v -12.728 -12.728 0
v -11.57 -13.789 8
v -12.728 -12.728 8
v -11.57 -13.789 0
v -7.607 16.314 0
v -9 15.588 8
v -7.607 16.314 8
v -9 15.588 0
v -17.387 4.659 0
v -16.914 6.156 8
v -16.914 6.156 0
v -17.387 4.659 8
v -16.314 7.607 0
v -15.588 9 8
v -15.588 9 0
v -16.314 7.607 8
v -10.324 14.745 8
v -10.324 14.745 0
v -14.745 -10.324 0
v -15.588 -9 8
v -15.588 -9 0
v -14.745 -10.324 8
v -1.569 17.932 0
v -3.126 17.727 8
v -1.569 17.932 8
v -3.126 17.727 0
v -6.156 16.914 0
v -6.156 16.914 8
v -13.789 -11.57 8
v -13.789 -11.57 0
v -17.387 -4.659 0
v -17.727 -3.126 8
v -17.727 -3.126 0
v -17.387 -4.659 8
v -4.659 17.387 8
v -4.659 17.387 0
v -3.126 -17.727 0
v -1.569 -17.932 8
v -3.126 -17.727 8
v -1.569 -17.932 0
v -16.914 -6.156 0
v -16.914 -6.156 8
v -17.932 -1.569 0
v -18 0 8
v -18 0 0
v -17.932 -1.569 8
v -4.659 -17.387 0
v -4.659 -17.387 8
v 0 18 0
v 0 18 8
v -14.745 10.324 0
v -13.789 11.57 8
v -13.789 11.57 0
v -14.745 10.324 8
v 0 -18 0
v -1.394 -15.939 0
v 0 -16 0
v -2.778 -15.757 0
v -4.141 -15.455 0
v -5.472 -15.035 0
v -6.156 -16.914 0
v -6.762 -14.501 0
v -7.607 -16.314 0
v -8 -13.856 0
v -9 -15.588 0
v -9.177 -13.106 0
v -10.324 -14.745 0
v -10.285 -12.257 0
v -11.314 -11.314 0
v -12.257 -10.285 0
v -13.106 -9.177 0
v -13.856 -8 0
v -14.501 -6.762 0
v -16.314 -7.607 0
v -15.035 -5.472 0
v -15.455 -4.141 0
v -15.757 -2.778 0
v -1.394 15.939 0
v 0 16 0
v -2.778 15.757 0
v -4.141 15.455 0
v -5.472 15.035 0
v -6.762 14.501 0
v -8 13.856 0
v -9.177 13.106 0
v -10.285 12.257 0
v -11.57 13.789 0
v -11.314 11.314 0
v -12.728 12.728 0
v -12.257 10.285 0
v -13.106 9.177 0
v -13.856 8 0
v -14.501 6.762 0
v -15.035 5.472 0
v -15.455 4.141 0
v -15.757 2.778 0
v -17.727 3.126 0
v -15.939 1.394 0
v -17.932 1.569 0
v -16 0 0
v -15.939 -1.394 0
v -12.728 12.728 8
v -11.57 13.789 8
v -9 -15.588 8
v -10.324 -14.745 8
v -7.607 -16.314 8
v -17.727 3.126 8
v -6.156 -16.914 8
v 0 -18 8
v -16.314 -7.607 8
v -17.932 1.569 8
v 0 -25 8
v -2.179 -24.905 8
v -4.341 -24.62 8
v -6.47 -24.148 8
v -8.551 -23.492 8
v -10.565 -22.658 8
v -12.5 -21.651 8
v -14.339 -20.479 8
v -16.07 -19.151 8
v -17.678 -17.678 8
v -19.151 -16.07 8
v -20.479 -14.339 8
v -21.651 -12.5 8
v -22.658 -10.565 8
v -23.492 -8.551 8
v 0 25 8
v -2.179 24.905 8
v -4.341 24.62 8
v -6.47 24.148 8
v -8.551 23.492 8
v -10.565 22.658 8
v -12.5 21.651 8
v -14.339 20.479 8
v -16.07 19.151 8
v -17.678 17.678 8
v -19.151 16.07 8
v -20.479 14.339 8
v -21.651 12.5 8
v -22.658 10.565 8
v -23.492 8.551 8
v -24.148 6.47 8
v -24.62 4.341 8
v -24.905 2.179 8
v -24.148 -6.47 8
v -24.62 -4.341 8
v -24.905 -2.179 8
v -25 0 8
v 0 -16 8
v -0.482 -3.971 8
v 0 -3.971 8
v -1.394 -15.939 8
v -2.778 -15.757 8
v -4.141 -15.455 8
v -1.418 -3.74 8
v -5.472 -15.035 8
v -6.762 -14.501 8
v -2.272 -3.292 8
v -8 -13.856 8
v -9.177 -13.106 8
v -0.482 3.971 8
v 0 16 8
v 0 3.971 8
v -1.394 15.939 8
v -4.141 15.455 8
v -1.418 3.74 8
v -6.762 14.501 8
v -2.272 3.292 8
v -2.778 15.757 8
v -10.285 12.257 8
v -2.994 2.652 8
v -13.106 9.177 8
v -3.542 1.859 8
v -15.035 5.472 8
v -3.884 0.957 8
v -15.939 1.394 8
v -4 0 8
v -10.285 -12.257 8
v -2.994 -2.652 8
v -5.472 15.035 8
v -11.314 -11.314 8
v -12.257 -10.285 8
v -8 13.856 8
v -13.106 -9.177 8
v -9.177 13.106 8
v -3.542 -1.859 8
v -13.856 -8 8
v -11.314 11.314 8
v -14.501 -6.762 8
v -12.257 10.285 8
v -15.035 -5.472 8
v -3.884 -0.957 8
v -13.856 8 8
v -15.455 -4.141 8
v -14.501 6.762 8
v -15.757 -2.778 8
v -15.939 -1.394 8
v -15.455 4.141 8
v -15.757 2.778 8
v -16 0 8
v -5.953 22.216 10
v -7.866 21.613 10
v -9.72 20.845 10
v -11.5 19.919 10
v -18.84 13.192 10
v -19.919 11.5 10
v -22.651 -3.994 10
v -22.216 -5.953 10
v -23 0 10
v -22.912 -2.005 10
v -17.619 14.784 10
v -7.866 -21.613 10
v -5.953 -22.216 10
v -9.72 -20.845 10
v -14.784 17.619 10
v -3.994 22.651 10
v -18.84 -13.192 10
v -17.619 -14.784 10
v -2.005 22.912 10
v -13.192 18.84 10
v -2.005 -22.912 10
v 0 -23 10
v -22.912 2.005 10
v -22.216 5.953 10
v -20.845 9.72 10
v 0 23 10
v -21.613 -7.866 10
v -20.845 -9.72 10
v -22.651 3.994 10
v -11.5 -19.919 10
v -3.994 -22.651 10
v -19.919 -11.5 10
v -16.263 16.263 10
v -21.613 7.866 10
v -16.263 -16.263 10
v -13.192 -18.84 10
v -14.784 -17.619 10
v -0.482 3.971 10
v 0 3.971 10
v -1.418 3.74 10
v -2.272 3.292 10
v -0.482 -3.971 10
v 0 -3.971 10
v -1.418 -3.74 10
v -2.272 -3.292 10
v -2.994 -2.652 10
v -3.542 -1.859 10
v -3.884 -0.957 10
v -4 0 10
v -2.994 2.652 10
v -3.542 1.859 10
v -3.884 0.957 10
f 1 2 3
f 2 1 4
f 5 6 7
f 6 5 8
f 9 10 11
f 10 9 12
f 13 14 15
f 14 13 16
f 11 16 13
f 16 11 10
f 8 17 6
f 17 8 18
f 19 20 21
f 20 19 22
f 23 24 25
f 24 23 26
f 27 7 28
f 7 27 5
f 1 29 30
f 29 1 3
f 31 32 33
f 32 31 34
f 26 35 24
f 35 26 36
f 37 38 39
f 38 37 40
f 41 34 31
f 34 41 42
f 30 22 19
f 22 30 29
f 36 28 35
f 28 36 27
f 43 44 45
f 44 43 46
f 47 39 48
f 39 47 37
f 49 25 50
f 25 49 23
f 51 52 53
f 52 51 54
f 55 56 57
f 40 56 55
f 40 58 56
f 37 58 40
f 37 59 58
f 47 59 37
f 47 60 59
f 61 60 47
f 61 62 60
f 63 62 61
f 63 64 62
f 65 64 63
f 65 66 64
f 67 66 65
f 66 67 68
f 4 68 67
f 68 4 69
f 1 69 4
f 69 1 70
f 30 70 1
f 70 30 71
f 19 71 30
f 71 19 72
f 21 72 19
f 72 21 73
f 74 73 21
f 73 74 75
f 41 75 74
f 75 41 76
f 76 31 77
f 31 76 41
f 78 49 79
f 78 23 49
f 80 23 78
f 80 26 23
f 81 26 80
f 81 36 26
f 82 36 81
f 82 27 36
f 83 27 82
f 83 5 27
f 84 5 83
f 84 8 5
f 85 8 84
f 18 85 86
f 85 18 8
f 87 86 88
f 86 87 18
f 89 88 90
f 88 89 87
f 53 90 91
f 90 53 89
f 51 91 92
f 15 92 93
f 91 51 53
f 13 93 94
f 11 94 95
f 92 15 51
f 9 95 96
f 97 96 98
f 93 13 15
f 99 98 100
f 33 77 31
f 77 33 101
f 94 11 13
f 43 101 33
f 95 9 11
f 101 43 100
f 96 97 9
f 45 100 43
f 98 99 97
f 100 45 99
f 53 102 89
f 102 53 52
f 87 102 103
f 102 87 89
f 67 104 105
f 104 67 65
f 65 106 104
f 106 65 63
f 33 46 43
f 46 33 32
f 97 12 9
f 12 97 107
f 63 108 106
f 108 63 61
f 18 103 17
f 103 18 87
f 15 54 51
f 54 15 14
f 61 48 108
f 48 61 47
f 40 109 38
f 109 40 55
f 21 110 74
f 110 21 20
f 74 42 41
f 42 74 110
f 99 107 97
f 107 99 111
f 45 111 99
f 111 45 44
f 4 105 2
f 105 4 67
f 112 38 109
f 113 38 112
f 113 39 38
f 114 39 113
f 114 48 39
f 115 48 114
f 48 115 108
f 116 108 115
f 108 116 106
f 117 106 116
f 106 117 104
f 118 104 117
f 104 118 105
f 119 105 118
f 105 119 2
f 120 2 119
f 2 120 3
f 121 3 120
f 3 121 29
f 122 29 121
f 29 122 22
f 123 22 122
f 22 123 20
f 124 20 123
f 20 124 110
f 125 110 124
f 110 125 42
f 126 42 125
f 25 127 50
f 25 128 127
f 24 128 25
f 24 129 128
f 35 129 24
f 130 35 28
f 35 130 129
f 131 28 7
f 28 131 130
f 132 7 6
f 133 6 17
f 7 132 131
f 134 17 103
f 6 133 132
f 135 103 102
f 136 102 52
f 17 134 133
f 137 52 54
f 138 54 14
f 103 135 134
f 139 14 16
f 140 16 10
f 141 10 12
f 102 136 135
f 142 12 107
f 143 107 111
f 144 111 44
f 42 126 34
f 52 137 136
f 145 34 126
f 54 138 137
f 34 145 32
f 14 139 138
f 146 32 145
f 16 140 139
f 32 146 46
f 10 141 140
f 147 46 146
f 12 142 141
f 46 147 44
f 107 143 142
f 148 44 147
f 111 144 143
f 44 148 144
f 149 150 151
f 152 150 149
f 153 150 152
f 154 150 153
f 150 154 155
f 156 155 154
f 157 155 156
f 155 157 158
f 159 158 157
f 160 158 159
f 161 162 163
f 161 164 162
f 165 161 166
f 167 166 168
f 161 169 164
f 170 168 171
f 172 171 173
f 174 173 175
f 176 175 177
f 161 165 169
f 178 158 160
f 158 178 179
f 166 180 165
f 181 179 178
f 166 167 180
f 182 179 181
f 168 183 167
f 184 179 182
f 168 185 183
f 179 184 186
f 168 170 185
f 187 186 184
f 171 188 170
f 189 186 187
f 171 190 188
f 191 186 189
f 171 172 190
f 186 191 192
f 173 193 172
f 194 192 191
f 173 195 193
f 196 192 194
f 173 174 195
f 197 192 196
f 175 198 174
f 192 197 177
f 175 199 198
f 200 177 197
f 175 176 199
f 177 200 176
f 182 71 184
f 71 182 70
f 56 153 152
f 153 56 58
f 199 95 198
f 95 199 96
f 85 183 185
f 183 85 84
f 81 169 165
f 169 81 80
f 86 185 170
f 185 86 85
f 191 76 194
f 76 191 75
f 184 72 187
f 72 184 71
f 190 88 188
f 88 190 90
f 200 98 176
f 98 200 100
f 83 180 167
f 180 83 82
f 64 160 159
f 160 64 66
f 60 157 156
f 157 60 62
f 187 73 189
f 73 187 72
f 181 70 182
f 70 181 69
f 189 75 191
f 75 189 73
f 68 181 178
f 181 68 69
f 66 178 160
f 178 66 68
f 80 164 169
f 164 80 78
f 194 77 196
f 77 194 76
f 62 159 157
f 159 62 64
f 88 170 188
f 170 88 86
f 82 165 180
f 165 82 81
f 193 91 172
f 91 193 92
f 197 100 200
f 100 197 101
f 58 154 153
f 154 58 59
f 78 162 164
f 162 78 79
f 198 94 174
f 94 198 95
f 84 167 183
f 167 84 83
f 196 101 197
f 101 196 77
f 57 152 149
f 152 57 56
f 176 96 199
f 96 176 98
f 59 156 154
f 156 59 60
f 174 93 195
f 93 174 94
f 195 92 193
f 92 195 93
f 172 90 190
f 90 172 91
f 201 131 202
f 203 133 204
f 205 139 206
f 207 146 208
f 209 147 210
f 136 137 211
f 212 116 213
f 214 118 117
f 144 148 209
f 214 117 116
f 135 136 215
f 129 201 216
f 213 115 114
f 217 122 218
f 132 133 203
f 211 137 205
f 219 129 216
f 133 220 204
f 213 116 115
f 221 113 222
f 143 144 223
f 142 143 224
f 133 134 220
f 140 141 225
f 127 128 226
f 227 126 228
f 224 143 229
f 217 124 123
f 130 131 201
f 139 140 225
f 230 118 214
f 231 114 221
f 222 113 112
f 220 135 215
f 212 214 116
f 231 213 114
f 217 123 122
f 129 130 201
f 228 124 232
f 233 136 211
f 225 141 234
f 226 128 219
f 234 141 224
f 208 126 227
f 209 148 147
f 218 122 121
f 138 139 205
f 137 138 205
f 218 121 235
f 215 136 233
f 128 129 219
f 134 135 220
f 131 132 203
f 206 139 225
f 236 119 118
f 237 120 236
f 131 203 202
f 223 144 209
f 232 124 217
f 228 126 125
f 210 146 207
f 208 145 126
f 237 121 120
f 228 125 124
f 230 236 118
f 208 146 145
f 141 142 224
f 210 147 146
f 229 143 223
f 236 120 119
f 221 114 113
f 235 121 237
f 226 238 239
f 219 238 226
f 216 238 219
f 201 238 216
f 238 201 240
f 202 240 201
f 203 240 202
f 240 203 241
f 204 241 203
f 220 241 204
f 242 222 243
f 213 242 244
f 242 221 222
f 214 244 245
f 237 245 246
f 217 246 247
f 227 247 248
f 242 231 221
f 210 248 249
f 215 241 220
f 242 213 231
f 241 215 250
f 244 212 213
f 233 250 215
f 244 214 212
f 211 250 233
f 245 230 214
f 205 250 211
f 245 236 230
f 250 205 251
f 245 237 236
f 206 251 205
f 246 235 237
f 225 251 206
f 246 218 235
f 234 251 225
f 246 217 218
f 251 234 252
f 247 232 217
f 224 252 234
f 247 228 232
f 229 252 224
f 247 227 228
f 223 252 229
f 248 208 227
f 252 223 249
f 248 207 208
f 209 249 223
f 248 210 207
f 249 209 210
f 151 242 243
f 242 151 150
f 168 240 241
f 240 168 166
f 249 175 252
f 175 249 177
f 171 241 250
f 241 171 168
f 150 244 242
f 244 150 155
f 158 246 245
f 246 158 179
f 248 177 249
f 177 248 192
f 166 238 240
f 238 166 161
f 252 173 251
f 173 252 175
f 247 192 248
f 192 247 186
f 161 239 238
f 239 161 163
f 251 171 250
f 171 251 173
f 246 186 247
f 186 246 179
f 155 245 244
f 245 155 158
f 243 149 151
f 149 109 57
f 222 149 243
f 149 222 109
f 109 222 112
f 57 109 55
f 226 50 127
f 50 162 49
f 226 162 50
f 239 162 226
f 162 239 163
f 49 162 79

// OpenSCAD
inner_r = 4;
outer_r = 18;
top_r = 25;
top_h = 2;
bottom_h = 8;

$fs=1;
$fa=5;

module ring(h, inner_r, outer_r, slant=0) {
    difference() {
        cylinder(h, outer_r, outer_r-slant);
        translate([0,0,-1]) cylinder(h+2, inner_r, inner_r);
    }
}


difference() {
    union() {
        ring(bottom_h, outer_r-2, outer_r);
        translate([0, 0, bottom_h]) ring(top_h, inner_r, top_r, slant=2);
    }
    translate([20, 0, 0]) cube([40, 50, 50], center=true);
}
